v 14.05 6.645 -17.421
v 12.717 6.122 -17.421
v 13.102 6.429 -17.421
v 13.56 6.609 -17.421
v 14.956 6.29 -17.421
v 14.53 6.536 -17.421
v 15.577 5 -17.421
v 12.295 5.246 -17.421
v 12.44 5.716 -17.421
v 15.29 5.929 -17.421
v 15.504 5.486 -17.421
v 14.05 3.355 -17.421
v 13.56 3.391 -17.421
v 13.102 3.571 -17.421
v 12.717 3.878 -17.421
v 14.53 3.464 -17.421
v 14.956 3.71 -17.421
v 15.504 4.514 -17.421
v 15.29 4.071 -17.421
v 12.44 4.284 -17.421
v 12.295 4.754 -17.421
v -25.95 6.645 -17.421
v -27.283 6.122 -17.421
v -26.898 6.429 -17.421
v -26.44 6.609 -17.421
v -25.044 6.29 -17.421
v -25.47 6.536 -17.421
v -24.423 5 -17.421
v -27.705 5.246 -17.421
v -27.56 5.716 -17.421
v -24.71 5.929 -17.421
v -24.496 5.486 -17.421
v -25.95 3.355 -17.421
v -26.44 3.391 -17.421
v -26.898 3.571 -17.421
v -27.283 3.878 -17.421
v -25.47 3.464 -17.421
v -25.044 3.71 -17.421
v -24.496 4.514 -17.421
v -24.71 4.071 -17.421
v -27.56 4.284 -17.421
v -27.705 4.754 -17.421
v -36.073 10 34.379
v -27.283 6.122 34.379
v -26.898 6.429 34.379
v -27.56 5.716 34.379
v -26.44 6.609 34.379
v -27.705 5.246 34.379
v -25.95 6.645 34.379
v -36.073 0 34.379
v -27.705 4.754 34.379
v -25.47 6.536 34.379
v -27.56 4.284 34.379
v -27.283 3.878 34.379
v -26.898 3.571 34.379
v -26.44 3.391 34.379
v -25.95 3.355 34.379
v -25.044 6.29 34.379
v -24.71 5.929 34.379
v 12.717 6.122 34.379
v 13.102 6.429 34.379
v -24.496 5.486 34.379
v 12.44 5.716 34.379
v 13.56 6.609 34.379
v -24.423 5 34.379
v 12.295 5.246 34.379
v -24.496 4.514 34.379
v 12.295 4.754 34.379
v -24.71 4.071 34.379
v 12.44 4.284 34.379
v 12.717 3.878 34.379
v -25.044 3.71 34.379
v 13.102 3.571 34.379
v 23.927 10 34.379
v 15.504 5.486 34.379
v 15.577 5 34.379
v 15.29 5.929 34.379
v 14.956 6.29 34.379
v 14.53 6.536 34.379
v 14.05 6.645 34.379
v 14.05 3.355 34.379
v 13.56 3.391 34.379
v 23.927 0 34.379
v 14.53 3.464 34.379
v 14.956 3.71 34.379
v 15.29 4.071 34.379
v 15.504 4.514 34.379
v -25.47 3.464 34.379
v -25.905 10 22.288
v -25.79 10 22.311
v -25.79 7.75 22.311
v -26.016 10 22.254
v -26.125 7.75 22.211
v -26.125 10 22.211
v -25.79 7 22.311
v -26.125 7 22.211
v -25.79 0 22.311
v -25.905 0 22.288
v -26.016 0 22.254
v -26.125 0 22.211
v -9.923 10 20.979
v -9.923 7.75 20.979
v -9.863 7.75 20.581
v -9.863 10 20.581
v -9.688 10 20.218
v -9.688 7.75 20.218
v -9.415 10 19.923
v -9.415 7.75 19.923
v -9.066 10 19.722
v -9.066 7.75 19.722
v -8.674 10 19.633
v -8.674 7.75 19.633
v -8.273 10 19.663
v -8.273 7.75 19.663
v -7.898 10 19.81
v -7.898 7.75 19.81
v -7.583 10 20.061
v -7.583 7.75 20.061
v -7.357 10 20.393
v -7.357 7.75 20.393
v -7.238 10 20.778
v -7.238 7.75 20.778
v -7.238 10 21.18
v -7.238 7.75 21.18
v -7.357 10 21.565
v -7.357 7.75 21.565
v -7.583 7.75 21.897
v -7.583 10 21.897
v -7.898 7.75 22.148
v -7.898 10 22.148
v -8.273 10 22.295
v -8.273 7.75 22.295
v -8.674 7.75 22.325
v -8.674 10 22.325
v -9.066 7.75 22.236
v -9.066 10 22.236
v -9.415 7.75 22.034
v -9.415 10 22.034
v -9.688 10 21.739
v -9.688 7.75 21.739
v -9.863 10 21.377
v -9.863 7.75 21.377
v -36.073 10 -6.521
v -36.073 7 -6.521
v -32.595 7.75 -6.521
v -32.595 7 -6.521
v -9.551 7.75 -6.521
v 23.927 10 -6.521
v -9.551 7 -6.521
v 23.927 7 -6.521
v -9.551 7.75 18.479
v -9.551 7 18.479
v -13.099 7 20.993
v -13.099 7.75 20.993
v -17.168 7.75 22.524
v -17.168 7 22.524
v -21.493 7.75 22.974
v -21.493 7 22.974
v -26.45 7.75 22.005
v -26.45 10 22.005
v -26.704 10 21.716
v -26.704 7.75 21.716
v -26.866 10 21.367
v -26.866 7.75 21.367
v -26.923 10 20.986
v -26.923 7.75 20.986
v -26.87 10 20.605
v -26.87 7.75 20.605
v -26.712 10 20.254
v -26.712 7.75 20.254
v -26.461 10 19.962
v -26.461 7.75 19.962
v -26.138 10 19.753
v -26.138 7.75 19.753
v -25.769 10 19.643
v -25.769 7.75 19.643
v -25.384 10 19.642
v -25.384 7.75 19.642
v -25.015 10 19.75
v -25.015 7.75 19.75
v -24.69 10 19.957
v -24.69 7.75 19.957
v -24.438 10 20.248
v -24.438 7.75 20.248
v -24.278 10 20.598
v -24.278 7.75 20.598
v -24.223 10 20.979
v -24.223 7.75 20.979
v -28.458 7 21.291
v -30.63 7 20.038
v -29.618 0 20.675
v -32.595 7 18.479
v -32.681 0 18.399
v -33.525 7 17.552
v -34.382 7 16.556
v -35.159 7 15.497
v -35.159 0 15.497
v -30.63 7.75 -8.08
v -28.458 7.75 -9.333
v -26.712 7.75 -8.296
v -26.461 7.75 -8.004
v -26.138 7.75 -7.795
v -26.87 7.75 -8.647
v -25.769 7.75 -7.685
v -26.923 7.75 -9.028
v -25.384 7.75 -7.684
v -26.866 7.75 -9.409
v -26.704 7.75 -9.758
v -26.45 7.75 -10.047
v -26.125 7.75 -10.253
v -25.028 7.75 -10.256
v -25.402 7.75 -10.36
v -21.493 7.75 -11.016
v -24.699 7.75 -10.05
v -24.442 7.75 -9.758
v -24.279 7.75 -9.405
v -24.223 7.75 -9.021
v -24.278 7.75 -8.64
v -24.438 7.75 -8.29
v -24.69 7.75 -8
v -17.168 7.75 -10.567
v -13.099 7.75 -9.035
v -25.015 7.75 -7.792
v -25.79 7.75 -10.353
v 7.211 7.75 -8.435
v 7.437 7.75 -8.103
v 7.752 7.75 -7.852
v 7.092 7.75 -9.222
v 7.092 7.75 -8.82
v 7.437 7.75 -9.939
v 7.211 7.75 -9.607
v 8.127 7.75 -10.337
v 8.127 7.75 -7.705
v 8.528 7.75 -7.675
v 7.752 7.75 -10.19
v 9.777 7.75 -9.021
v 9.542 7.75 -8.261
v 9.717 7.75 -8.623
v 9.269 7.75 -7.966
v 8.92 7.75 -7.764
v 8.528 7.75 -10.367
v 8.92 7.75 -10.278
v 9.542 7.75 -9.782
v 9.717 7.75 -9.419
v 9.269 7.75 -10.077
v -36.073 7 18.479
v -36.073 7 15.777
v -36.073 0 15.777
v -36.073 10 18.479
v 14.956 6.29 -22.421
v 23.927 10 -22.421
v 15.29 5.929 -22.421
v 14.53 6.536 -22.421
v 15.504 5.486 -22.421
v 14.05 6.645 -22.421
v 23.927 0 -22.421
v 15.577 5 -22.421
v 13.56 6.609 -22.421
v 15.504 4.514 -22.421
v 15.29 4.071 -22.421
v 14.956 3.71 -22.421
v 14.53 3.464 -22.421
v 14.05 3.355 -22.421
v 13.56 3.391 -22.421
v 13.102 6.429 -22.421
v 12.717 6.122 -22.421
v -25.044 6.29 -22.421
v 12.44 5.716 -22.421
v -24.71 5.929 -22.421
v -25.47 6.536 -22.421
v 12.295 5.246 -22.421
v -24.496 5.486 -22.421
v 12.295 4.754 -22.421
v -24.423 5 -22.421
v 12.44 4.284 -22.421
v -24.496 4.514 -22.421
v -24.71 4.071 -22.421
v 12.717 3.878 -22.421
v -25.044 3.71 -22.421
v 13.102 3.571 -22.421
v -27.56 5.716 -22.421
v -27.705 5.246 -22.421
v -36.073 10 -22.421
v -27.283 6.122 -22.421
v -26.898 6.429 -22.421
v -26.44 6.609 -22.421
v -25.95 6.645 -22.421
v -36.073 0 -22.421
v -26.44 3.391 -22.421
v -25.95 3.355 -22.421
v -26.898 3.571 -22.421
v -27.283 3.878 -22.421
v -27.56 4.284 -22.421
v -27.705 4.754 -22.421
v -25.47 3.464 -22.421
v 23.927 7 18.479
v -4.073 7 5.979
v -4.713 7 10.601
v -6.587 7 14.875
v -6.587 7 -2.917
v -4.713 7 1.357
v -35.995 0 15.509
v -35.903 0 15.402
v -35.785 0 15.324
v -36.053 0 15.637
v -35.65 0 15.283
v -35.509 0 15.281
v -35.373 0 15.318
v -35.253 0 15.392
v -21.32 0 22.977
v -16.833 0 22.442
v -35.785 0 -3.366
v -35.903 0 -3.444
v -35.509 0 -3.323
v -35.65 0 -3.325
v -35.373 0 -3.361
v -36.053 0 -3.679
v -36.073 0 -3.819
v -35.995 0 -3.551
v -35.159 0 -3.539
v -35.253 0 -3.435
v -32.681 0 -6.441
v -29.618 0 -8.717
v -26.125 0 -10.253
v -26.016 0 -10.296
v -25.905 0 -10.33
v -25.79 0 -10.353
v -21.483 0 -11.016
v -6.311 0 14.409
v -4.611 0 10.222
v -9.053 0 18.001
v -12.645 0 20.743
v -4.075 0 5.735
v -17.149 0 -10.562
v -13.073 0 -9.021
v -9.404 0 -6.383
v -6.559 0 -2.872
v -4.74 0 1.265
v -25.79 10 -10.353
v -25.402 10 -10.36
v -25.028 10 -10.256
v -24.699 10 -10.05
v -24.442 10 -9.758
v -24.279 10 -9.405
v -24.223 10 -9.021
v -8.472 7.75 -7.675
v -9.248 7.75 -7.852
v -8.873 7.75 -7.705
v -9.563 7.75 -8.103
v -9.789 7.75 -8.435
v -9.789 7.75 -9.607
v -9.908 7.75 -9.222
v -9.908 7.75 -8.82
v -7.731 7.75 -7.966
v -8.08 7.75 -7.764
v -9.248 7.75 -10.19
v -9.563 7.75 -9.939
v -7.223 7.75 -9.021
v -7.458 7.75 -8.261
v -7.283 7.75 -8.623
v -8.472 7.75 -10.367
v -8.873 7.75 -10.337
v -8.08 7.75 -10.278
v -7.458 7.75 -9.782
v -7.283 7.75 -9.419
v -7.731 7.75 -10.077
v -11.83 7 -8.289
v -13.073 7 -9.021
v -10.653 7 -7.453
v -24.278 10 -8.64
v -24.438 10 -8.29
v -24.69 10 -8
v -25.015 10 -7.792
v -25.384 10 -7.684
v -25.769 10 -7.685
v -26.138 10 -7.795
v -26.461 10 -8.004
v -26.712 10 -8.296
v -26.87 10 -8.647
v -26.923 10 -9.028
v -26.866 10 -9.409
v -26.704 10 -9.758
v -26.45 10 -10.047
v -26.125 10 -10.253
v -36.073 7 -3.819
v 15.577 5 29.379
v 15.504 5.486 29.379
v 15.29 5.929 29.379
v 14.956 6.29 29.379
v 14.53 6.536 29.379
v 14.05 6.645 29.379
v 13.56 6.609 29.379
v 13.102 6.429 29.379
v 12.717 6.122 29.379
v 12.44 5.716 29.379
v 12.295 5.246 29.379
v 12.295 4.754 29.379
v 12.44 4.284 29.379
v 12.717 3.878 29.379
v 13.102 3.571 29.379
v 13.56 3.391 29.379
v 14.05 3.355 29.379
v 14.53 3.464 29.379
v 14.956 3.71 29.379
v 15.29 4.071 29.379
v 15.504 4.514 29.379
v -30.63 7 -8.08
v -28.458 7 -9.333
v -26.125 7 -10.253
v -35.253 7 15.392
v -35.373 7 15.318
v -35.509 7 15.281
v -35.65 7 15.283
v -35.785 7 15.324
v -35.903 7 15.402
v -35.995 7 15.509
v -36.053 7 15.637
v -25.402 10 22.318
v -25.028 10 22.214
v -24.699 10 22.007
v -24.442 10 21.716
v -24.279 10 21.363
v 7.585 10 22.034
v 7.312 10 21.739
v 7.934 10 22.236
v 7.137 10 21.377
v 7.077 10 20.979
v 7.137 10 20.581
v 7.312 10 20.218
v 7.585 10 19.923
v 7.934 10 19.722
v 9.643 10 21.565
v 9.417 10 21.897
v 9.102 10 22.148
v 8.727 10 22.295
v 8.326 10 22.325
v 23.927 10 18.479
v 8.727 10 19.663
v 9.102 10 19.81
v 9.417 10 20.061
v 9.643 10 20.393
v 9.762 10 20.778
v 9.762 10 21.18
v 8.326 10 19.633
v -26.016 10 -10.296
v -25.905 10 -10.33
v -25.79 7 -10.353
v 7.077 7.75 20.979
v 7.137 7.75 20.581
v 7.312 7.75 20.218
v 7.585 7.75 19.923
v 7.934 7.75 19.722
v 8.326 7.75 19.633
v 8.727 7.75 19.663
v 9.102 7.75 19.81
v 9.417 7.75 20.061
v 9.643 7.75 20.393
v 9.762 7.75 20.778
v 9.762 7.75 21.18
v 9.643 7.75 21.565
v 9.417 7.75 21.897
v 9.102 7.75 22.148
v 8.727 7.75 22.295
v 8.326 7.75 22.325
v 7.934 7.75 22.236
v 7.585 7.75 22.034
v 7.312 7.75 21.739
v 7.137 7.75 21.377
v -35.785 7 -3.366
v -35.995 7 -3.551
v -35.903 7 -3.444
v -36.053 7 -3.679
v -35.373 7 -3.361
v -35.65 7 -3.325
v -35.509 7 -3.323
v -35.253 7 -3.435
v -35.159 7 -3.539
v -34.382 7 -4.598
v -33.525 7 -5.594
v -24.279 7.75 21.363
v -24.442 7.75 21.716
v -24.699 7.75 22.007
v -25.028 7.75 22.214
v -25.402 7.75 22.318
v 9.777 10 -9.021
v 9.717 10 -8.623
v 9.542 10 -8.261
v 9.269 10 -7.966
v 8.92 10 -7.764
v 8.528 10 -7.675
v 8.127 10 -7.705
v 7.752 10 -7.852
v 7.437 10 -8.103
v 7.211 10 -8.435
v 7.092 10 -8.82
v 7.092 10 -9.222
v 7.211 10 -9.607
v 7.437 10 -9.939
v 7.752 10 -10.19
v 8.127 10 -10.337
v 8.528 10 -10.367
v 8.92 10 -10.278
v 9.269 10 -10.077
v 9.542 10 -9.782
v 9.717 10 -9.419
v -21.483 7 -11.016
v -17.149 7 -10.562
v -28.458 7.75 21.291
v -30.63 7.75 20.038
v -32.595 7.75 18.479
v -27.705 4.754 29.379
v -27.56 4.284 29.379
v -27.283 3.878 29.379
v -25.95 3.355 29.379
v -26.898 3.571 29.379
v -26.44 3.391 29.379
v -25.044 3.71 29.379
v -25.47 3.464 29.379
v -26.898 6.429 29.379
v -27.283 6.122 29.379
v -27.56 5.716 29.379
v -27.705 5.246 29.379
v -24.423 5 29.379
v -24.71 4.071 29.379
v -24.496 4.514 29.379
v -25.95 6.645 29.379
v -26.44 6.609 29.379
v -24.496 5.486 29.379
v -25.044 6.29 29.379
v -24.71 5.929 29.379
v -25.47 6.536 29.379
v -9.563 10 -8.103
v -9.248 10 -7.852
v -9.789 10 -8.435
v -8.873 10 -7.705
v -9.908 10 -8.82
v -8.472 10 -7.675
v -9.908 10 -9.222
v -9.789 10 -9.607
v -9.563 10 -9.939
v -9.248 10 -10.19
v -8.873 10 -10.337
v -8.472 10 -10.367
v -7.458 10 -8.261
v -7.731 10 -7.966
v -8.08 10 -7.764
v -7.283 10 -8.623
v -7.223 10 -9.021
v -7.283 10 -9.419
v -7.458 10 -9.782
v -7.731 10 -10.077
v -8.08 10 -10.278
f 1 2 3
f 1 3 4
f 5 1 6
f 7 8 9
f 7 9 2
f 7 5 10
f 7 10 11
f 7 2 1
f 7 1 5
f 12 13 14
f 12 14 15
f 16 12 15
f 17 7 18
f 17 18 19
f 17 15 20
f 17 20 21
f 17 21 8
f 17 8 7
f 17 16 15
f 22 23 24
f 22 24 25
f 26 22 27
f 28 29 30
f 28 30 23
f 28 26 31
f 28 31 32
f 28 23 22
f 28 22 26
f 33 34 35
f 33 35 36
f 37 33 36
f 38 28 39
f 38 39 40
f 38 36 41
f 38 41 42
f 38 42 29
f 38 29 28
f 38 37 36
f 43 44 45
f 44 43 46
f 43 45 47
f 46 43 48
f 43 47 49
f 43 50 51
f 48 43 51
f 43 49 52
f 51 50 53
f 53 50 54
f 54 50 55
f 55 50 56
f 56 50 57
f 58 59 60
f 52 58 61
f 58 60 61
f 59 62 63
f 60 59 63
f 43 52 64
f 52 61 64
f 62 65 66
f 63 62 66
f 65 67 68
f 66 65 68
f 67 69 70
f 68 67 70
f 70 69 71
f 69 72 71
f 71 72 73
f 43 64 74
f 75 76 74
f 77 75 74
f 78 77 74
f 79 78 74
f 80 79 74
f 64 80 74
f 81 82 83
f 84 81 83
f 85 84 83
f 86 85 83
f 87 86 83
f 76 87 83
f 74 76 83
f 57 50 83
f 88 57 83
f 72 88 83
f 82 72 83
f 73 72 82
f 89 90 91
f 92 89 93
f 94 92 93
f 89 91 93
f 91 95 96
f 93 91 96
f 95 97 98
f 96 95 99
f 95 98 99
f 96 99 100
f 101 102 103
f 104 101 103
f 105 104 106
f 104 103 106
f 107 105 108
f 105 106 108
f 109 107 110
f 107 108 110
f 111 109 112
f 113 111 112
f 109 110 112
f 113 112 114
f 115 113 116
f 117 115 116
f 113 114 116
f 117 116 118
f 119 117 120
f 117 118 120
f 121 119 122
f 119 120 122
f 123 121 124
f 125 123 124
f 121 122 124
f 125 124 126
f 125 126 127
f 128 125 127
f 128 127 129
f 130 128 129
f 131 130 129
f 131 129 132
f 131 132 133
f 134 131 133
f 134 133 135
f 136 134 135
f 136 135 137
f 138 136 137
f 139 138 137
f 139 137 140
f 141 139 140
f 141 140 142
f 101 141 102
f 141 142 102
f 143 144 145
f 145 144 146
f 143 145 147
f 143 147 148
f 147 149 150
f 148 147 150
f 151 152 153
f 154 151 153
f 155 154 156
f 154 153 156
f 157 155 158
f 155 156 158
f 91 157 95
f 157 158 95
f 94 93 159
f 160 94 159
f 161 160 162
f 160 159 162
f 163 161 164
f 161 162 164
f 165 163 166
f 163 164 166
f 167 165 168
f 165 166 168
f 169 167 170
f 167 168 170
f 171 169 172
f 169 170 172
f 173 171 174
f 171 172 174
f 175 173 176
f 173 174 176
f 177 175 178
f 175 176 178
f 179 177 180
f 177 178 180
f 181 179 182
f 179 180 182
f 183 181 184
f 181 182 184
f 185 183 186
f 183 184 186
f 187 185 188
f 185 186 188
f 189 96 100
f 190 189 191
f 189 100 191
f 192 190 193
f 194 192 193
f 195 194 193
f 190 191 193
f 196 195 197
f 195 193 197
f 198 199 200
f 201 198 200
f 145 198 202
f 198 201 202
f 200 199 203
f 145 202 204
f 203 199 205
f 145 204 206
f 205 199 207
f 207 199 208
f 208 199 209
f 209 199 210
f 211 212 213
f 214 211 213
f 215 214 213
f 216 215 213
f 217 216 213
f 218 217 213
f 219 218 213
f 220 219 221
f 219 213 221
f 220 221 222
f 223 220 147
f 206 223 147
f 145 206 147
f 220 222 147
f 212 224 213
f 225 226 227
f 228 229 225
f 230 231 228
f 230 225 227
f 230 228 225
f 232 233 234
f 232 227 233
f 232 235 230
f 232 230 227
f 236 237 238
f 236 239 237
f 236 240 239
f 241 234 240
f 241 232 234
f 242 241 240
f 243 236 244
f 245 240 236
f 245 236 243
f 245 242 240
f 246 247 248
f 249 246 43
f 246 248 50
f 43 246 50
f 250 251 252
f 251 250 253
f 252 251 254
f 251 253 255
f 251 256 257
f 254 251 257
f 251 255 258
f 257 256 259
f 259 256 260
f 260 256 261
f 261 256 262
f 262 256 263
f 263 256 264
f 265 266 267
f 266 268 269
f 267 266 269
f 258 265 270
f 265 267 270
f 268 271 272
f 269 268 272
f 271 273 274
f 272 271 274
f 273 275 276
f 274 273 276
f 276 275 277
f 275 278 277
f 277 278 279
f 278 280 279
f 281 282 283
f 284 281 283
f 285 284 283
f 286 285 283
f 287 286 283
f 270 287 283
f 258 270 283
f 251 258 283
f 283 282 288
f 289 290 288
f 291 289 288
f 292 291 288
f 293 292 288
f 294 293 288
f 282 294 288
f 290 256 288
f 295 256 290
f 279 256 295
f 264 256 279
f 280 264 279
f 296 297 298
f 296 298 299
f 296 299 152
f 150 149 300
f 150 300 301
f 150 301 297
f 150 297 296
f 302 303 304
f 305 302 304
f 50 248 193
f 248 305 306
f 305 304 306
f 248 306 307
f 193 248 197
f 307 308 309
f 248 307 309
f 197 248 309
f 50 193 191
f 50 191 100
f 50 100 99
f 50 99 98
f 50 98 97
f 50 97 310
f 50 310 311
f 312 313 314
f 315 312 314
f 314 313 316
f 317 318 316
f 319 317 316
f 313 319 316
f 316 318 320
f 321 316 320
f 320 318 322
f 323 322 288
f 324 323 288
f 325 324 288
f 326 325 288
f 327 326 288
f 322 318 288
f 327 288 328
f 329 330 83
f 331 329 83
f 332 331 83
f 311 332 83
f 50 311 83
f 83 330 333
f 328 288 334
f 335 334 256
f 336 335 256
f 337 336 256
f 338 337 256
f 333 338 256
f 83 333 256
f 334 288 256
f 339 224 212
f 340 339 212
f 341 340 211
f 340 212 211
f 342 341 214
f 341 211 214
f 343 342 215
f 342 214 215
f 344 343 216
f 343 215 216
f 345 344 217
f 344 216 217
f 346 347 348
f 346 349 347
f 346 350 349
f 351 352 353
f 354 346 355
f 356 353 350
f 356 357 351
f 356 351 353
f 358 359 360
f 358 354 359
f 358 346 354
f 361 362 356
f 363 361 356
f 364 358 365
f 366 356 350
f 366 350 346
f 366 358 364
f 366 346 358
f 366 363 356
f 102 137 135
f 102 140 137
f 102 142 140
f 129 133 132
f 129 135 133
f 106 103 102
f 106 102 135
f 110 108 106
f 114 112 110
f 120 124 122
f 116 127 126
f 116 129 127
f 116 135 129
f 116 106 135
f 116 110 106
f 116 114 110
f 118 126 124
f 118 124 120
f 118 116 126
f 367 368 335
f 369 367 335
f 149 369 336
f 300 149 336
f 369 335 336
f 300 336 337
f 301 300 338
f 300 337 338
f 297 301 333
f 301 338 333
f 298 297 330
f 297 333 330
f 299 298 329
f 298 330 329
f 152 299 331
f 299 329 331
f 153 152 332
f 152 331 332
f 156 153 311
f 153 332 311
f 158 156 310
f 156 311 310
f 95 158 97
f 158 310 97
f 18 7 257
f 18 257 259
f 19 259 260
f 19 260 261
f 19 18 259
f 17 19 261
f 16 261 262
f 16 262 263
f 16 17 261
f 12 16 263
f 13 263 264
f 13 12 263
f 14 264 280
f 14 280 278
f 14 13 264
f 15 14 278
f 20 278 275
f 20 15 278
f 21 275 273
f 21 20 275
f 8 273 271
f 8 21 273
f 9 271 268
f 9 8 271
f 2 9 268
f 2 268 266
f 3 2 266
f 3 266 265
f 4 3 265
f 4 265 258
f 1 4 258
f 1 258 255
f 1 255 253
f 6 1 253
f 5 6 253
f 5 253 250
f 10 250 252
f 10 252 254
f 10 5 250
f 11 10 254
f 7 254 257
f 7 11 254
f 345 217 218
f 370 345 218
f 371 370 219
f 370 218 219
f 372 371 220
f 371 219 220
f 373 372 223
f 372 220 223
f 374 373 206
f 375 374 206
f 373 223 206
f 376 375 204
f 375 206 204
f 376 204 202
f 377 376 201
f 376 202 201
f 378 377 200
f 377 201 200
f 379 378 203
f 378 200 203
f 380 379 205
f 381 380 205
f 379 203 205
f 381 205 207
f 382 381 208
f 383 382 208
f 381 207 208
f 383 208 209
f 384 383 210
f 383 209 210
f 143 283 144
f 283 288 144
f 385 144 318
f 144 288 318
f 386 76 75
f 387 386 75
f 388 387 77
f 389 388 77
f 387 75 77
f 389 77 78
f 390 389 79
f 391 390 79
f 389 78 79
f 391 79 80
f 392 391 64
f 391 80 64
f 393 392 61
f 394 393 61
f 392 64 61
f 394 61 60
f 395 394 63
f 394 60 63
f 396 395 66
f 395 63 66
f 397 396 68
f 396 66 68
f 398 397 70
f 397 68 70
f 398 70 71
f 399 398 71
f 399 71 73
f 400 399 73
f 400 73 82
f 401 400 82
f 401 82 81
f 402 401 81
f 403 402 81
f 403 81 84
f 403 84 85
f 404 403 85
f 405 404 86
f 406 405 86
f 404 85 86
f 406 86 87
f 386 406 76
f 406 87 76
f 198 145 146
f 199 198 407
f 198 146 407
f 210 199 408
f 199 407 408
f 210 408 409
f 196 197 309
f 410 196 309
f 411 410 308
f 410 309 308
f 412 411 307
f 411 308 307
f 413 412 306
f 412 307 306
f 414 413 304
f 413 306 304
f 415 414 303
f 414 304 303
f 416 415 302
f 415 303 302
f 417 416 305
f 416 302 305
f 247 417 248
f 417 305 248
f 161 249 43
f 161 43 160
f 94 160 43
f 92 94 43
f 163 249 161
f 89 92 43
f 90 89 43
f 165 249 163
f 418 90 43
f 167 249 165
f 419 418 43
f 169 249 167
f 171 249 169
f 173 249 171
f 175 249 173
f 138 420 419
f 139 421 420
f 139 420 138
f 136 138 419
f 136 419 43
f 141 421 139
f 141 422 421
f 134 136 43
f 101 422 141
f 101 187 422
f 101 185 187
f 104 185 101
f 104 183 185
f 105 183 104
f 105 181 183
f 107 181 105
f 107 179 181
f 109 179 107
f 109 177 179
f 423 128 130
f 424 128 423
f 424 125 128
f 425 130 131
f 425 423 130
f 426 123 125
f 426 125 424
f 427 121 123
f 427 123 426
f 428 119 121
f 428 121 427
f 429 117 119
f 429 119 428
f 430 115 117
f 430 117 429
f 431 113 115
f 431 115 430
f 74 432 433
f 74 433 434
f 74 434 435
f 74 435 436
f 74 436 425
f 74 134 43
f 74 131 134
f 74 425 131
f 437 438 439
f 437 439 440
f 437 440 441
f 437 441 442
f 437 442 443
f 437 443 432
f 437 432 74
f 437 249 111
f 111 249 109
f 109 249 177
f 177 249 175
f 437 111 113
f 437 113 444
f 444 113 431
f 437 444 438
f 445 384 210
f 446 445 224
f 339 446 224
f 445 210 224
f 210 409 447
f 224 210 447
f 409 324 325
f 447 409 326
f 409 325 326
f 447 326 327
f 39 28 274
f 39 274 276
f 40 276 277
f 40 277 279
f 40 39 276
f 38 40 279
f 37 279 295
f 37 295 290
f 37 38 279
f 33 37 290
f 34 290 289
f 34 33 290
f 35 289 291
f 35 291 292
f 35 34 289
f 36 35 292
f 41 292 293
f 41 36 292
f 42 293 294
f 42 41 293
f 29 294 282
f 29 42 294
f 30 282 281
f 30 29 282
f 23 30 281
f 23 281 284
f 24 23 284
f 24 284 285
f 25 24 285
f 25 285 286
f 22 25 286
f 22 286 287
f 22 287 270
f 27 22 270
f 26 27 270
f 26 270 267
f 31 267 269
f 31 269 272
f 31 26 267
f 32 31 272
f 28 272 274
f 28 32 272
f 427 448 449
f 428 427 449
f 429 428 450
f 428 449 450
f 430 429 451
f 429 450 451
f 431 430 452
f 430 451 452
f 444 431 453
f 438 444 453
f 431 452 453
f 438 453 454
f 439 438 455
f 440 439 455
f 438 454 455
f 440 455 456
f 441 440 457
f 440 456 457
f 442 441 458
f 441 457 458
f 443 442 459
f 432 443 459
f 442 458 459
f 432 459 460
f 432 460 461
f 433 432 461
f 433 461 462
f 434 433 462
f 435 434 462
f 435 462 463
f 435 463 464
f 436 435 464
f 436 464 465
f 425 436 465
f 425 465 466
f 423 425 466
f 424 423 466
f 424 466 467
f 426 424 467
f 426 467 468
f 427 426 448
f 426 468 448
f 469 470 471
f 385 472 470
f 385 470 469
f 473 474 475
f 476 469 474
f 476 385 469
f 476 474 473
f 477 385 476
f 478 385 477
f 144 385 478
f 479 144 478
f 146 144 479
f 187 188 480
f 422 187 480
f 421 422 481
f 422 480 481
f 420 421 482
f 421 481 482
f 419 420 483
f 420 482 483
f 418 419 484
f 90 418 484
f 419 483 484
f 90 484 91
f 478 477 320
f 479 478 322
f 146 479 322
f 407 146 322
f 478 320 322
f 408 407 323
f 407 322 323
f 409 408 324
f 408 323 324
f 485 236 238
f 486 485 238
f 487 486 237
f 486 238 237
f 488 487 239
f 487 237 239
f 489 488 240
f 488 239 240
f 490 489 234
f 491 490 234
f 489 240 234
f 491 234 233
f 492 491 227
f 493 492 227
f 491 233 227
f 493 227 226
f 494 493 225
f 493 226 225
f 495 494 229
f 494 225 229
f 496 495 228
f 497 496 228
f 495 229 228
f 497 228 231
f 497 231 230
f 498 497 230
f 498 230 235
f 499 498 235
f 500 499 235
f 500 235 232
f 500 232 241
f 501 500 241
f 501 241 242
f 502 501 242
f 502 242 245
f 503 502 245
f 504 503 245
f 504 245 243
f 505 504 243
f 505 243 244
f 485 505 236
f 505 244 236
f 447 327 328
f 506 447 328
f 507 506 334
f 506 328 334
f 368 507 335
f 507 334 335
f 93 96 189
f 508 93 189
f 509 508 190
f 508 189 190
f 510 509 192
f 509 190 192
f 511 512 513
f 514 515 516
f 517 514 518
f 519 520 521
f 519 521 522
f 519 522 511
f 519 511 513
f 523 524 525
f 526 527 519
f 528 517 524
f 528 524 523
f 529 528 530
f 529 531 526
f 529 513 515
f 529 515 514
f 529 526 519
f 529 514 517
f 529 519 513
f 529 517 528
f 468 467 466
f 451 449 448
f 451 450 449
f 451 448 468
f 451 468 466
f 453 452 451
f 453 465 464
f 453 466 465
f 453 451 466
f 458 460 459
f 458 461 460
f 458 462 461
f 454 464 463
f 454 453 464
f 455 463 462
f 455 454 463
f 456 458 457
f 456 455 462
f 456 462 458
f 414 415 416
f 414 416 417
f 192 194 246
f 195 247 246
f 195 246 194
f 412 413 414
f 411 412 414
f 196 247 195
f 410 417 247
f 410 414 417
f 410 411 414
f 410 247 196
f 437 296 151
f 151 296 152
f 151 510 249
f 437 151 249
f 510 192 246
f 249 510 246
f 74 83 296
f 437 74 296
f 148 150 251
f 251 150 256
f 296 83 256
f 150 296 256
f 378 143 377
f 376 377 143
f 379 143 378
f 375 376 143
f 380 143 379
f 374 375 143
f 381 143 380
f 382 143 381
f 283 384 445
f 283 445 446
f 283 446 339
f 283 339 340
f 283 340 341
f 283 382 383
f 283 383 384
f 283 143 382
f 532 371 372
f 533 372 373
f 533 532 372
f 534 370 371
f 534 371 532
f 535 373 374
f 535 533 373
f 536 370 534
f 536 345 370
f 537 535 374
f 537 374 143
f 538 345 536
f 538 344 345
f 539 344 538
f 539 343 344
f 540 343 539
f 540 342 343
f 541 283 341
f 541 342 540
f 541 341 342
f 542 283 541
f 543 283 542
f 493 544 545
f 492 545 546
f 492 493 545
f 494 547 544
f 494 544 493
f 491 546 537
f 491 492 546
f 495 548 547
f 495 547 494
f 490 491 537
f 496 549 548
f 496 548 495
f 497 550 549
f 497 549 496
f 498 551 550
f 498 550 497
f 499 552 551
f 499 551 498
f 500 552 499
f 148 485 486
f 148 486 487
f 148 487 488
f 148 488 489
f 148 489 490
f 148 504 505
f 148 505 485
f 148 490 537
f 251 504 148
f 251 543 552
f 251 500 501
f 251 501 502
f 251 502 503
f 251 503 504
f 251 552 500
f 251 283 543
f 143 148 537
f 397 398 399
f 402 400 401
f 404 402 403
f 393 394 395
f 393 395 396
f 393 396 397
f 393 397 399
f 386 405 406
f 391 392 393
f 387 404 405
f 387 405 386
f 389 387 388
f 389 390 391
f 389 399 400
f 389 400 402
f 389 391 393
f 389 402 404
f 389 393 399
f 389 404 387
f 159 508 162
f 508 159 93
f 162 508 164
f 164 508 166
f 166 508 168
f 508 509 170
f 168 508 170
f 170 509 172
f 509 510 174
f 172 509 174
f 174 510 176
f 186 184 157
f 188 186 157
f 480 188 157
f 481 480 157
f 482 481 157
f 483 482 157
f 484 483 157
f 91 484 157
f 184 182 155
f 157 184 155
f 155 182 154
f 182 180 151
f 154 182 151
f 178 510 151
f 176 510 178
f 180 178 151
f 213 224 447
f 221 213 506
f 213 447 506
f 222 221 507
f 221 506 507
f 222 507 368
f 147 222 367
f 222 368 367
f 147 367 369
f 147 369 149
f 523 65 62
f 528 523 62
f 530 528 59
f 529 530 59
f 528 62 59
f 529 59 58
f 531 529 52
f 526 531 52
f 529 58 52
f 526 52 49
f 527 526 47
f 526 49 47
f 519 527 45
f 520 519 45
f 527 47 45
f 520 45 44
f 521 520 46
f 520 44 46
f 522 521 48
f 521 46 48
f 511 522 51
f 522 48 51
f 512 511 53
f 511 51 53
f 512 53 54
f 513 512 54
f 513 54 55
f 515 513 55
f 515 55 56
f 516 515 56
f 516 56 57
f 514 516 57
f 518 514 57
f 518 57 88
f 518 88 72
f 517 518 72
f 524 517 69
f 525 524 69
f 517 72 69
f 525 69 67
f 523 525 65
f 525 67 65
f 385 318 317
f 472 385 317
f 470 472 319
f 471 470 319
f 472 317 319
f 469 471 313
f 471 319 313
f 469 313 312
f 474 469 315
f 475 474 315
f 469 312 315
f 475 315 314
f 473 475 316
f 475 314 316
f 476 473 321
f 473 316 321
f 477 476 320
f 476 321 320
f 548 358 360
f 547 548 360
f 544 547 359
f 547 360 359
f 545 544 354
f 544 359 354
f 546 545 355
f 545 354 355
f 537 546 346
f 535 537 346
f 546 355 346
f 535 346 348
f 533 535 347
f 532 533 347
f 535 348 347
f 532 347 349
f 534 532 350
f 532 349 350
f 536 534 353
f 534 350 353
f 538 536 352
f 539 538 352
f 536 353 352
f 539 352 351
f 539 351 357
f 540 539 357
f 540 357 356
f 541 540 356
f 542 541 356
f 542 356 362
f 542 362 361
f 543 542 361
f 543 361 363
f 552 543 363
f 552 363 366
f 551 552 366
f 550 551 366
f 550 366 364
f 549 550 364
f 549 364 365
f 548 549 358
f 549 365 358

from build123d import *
from build123d.topology import SkipClean

# Parameters (mm, degrees)
EXTRUDE_3_DEPTH     = 7
EXTRUDE_4_DEPTH     = 0.75
EXTRUDE_5_DEPTH     = 0.75
SKETCH_6_W          = 60
SKETCH_6_H          = 15.9
SKETCH_6_R          = 1.35
EXTRUDE_6_DEPTH     = 2.25
SKETCH_7_W          = 60
SKETCH_7_H          = 15.9
SKETCH_7_R          = 1.35
EXTRUDE_7_DEPTH     = 2.25
SKETCH_8_R          = 1.65
CUT_EXTRUDE_1_DEPTH = 5
CUT_EXTRUDE_START   = -5
SKETCH_9_R          = 1.65
CUT_EXTRUDE_2_DEPTH = 5


with BuildPart() as part:
    # 草图1 → 凸台-拉伸3 (new body)
    with BuildSketch(Plane(origin=(0, 0, 0), x_dir=(1, 0, 0), z_dir=(0, 1, 0))):
        with BuildLine():
            Line((-36.072982456, 22.421052632), (-36.072982456, 3.819011603))
            ThreePointArc((-36.072982456, 3.819011603), (-35.719367467, 3.340920159), (-35.158696742, 3.539069918))
            ThreePointArc((-35.158696742, 3.539069918), (-31.213626847, 7.665367614), (-26.125018269, 10.253025221))
            ThreePointArc((-26.125018269, 10.253025221), (-25.960902102, 10.314118117), (-25.79025857, 10.353453131))
            ThreePointArc((-25.79025857, 10.353453131), (-19.301572904, 10.928509809), (-13.072982456, 9.021052632))
            ThreePointArc((-13.072982456, 9.021052632), (-5.321033393, -12.372389376), (-25.79025857, -22.311347868))
            ThreePointArc((-25.79025857, -22.311347868), (-25.960902102, -22.272012853), (-26.125018269, -22.210919958))
            ThreePointArc((-26.125018269, -22.210919958), (-31.213626847, -19.623262351), (-35.158696742, -15.496964655))
            ThreePointArc((-35.158696742, -15.496964655), (-35.719367467, -15.298814896), (-36.072982456, -15.77690634))
            Line((-36.072982456, -15.77690634), (-36.072982456, -34.378947368))
            Line((-36.072982456, -34.378947368), (23.927017544, -34.378947368))
            Line((23.927017544, -34.378947368), (23.927017544, 22.421052632))
            Line((23.927017544, 22.421052632), (-36.072982456, 22.421052632))
        make_face()
    extrude(amount=EXTRUDE_3_DEPTH)

    # 草图5 → 凸台-拉伸4 (add)
    with BuildSketch(Plane(origin=(0, 7, 0), x_dir=(1, 0, 0), z_dir=(0, 1, 0))):
        with BuildLine():
            Line((-36.072982456, -34.378947368), (23.927017544, -34.378947368))
            Line((23.927017544, -34.378947368), (23.927017544, -18.478947368))
            Line((23.927017544, -18.478947368), (-9.551263834, -18.478947368))
            ThreePointArc((-9.551263834, -18.478947368), (-17.168250345, -22.524432165), (-25.79025857, -22.311347868))
            ThreePointArc((-25.79025857, -22.311347868), (-25.960902102, -22.272012853), (-26.125018269, -22.210919958))
            ThreePointArc((-26.125018269, -22.210919958), (-29.567347581, -20.704631092), (-32.594701078, -18.478947368))
            Line((-32.594701078, -18.478947368), (-36.072982456, -18.478947368))
            Line((-36.072982456, -18.478947368), (-36.072982456, -34.378947368))
        make_face()
    extrude(amount=EXTRUDE_4_DEPTH)

    # 草图5<3> → 凸台-拉伸5 (add)
    with BuildSketch(Plane(origin=(0, 7, 0), x_dir=(1, 0, 0), z_dir=(0, 1, 0))):
        with BuildLine():
            Line((-9.551263834, 6.521052632), (23.927017544, 6.521052632))
            Line((23.927017544, 6.521052632), (23.927017544, 22.421052632))
            Line((23.927017544, 22.421052632), (-36.072982456, 22.421052632))
            Line((-36.072982456, 22.421052632), (-36.072982456, 6.521052632))
            Line((-36.072982456, 6.521052632), (-32.594701078, 6.521052632))
            ThreePointArc((-32.594701078, 6.521052632), (-29.567347581, 8.746736355), (-26.125018269, 10.253025221))
            ThreePointArc((-26.125018269, 10.253025221), (-25.960902102, 10.314118117), (-25.79025857, 10.353453131))
            ThreePointArc((-25.79025857, 10.353453131), (-17.168250345, 10.566537428), (-9.551263834, 6.521052632))
        make_face()
    extrude(amount=EXTRUDE_5_DEPTH)

    # 草图6 → 凸台-拉伸6 (add)
    with SkipClean():  # the faces are left unmerged after this step: merging them gives an invalid solid
        with BuildSketch(Plane(origin=(0, 7.75, 0), x_dir=(1, 0, 0), z_dir=(0, 1, 0))):
            with Locations((-6.072982456, -26.428947368)):
                Rectangle(SKETCH_6_W, SKETCH_6_H)
            with Locations((-25.572982456, -20.978947368)):
                Circle(SKETCH_6_R, mode=Mode.SUBTRACT)
            with Locations((-8.572982456, -20.978947368)):
                Circle(SKETCH_6_R, mode=Mode.SUBTRACT)
            with Locations((8.427017544, -20.978947368)):
                Circle(SKETCH_6_R, mode=Mode.SUBTRACT)
        extrude(amount=EXTRUDE_6_DEPTH)

    # 草图7 → 凸台-拉伸7 (add)
    with SkipClean():  # the faces are left unmerged after this step: merging them gives an invalid solid
        with BuildSketch(Plane(origin=(0, 7.75, 0), x_dir=(1, 0, 0), z_dir=(0, 1, 0))):
            with Locations((-6.072982456, 14.471052632)):
                Rectangle(SKETCH_7_W, SKETCH_7_H)
            with Locations((8.427017544, 9.021052632)):
                Circle(SKETCH_7_R, mode=Mode.SUBTRACT)
            with Locations((-8.572982456, 9.021052632)):
                Circle(SKETCH_7_R, mode=Mode.SUBTRACT)
            with Locations((-25.572982456, 9.021052632)):
                Circle(SKETCH_7_R, mode=Mode.SUBTRACT)
        extrude(amount=EXTRUDE_7_DEPTH)

    # 草图8 → 切除-拉伸1 (cut)
    with SkipClean():  # the faces are left unmerged after this step: merging them gives an invalid solid
        with BuildSketch(Plane.XY.offset(34.378947368)):
            with Locations((-26.072982456, 5)):
                Circle(SKETCH_8_R)
            with Locations((13.927017544, 5)):
                Circle(SKETCH_8_R)
        extrude(amount=-CUT_EXTRUDE_1_DEPTH, mode=Mode.SUBTRACT)

    # 草图9 → 切除-拉伸2 (cut)
    with SkipClean():  # the faces are left unmerged after this step: merging them gives an invalid solid
        with BuildSketch(Plane(origin=(0, 0, -22.421052632), x_dir=(-1, 0, 0), z_dir=(0, 0, -1)).offset(CUT_EXTRUDE_START)):
            with Locations((26.072982456, 5)):
                Circle(SKETCH_9_R)
            with Locations((-13.927017544, 5)):
                Circle(SKETCH_9_R)
        extrude(amount=CUT_EXTRUDE_2_DEPTH, mode=Mode.SUBTRACT)


solid = part.part
